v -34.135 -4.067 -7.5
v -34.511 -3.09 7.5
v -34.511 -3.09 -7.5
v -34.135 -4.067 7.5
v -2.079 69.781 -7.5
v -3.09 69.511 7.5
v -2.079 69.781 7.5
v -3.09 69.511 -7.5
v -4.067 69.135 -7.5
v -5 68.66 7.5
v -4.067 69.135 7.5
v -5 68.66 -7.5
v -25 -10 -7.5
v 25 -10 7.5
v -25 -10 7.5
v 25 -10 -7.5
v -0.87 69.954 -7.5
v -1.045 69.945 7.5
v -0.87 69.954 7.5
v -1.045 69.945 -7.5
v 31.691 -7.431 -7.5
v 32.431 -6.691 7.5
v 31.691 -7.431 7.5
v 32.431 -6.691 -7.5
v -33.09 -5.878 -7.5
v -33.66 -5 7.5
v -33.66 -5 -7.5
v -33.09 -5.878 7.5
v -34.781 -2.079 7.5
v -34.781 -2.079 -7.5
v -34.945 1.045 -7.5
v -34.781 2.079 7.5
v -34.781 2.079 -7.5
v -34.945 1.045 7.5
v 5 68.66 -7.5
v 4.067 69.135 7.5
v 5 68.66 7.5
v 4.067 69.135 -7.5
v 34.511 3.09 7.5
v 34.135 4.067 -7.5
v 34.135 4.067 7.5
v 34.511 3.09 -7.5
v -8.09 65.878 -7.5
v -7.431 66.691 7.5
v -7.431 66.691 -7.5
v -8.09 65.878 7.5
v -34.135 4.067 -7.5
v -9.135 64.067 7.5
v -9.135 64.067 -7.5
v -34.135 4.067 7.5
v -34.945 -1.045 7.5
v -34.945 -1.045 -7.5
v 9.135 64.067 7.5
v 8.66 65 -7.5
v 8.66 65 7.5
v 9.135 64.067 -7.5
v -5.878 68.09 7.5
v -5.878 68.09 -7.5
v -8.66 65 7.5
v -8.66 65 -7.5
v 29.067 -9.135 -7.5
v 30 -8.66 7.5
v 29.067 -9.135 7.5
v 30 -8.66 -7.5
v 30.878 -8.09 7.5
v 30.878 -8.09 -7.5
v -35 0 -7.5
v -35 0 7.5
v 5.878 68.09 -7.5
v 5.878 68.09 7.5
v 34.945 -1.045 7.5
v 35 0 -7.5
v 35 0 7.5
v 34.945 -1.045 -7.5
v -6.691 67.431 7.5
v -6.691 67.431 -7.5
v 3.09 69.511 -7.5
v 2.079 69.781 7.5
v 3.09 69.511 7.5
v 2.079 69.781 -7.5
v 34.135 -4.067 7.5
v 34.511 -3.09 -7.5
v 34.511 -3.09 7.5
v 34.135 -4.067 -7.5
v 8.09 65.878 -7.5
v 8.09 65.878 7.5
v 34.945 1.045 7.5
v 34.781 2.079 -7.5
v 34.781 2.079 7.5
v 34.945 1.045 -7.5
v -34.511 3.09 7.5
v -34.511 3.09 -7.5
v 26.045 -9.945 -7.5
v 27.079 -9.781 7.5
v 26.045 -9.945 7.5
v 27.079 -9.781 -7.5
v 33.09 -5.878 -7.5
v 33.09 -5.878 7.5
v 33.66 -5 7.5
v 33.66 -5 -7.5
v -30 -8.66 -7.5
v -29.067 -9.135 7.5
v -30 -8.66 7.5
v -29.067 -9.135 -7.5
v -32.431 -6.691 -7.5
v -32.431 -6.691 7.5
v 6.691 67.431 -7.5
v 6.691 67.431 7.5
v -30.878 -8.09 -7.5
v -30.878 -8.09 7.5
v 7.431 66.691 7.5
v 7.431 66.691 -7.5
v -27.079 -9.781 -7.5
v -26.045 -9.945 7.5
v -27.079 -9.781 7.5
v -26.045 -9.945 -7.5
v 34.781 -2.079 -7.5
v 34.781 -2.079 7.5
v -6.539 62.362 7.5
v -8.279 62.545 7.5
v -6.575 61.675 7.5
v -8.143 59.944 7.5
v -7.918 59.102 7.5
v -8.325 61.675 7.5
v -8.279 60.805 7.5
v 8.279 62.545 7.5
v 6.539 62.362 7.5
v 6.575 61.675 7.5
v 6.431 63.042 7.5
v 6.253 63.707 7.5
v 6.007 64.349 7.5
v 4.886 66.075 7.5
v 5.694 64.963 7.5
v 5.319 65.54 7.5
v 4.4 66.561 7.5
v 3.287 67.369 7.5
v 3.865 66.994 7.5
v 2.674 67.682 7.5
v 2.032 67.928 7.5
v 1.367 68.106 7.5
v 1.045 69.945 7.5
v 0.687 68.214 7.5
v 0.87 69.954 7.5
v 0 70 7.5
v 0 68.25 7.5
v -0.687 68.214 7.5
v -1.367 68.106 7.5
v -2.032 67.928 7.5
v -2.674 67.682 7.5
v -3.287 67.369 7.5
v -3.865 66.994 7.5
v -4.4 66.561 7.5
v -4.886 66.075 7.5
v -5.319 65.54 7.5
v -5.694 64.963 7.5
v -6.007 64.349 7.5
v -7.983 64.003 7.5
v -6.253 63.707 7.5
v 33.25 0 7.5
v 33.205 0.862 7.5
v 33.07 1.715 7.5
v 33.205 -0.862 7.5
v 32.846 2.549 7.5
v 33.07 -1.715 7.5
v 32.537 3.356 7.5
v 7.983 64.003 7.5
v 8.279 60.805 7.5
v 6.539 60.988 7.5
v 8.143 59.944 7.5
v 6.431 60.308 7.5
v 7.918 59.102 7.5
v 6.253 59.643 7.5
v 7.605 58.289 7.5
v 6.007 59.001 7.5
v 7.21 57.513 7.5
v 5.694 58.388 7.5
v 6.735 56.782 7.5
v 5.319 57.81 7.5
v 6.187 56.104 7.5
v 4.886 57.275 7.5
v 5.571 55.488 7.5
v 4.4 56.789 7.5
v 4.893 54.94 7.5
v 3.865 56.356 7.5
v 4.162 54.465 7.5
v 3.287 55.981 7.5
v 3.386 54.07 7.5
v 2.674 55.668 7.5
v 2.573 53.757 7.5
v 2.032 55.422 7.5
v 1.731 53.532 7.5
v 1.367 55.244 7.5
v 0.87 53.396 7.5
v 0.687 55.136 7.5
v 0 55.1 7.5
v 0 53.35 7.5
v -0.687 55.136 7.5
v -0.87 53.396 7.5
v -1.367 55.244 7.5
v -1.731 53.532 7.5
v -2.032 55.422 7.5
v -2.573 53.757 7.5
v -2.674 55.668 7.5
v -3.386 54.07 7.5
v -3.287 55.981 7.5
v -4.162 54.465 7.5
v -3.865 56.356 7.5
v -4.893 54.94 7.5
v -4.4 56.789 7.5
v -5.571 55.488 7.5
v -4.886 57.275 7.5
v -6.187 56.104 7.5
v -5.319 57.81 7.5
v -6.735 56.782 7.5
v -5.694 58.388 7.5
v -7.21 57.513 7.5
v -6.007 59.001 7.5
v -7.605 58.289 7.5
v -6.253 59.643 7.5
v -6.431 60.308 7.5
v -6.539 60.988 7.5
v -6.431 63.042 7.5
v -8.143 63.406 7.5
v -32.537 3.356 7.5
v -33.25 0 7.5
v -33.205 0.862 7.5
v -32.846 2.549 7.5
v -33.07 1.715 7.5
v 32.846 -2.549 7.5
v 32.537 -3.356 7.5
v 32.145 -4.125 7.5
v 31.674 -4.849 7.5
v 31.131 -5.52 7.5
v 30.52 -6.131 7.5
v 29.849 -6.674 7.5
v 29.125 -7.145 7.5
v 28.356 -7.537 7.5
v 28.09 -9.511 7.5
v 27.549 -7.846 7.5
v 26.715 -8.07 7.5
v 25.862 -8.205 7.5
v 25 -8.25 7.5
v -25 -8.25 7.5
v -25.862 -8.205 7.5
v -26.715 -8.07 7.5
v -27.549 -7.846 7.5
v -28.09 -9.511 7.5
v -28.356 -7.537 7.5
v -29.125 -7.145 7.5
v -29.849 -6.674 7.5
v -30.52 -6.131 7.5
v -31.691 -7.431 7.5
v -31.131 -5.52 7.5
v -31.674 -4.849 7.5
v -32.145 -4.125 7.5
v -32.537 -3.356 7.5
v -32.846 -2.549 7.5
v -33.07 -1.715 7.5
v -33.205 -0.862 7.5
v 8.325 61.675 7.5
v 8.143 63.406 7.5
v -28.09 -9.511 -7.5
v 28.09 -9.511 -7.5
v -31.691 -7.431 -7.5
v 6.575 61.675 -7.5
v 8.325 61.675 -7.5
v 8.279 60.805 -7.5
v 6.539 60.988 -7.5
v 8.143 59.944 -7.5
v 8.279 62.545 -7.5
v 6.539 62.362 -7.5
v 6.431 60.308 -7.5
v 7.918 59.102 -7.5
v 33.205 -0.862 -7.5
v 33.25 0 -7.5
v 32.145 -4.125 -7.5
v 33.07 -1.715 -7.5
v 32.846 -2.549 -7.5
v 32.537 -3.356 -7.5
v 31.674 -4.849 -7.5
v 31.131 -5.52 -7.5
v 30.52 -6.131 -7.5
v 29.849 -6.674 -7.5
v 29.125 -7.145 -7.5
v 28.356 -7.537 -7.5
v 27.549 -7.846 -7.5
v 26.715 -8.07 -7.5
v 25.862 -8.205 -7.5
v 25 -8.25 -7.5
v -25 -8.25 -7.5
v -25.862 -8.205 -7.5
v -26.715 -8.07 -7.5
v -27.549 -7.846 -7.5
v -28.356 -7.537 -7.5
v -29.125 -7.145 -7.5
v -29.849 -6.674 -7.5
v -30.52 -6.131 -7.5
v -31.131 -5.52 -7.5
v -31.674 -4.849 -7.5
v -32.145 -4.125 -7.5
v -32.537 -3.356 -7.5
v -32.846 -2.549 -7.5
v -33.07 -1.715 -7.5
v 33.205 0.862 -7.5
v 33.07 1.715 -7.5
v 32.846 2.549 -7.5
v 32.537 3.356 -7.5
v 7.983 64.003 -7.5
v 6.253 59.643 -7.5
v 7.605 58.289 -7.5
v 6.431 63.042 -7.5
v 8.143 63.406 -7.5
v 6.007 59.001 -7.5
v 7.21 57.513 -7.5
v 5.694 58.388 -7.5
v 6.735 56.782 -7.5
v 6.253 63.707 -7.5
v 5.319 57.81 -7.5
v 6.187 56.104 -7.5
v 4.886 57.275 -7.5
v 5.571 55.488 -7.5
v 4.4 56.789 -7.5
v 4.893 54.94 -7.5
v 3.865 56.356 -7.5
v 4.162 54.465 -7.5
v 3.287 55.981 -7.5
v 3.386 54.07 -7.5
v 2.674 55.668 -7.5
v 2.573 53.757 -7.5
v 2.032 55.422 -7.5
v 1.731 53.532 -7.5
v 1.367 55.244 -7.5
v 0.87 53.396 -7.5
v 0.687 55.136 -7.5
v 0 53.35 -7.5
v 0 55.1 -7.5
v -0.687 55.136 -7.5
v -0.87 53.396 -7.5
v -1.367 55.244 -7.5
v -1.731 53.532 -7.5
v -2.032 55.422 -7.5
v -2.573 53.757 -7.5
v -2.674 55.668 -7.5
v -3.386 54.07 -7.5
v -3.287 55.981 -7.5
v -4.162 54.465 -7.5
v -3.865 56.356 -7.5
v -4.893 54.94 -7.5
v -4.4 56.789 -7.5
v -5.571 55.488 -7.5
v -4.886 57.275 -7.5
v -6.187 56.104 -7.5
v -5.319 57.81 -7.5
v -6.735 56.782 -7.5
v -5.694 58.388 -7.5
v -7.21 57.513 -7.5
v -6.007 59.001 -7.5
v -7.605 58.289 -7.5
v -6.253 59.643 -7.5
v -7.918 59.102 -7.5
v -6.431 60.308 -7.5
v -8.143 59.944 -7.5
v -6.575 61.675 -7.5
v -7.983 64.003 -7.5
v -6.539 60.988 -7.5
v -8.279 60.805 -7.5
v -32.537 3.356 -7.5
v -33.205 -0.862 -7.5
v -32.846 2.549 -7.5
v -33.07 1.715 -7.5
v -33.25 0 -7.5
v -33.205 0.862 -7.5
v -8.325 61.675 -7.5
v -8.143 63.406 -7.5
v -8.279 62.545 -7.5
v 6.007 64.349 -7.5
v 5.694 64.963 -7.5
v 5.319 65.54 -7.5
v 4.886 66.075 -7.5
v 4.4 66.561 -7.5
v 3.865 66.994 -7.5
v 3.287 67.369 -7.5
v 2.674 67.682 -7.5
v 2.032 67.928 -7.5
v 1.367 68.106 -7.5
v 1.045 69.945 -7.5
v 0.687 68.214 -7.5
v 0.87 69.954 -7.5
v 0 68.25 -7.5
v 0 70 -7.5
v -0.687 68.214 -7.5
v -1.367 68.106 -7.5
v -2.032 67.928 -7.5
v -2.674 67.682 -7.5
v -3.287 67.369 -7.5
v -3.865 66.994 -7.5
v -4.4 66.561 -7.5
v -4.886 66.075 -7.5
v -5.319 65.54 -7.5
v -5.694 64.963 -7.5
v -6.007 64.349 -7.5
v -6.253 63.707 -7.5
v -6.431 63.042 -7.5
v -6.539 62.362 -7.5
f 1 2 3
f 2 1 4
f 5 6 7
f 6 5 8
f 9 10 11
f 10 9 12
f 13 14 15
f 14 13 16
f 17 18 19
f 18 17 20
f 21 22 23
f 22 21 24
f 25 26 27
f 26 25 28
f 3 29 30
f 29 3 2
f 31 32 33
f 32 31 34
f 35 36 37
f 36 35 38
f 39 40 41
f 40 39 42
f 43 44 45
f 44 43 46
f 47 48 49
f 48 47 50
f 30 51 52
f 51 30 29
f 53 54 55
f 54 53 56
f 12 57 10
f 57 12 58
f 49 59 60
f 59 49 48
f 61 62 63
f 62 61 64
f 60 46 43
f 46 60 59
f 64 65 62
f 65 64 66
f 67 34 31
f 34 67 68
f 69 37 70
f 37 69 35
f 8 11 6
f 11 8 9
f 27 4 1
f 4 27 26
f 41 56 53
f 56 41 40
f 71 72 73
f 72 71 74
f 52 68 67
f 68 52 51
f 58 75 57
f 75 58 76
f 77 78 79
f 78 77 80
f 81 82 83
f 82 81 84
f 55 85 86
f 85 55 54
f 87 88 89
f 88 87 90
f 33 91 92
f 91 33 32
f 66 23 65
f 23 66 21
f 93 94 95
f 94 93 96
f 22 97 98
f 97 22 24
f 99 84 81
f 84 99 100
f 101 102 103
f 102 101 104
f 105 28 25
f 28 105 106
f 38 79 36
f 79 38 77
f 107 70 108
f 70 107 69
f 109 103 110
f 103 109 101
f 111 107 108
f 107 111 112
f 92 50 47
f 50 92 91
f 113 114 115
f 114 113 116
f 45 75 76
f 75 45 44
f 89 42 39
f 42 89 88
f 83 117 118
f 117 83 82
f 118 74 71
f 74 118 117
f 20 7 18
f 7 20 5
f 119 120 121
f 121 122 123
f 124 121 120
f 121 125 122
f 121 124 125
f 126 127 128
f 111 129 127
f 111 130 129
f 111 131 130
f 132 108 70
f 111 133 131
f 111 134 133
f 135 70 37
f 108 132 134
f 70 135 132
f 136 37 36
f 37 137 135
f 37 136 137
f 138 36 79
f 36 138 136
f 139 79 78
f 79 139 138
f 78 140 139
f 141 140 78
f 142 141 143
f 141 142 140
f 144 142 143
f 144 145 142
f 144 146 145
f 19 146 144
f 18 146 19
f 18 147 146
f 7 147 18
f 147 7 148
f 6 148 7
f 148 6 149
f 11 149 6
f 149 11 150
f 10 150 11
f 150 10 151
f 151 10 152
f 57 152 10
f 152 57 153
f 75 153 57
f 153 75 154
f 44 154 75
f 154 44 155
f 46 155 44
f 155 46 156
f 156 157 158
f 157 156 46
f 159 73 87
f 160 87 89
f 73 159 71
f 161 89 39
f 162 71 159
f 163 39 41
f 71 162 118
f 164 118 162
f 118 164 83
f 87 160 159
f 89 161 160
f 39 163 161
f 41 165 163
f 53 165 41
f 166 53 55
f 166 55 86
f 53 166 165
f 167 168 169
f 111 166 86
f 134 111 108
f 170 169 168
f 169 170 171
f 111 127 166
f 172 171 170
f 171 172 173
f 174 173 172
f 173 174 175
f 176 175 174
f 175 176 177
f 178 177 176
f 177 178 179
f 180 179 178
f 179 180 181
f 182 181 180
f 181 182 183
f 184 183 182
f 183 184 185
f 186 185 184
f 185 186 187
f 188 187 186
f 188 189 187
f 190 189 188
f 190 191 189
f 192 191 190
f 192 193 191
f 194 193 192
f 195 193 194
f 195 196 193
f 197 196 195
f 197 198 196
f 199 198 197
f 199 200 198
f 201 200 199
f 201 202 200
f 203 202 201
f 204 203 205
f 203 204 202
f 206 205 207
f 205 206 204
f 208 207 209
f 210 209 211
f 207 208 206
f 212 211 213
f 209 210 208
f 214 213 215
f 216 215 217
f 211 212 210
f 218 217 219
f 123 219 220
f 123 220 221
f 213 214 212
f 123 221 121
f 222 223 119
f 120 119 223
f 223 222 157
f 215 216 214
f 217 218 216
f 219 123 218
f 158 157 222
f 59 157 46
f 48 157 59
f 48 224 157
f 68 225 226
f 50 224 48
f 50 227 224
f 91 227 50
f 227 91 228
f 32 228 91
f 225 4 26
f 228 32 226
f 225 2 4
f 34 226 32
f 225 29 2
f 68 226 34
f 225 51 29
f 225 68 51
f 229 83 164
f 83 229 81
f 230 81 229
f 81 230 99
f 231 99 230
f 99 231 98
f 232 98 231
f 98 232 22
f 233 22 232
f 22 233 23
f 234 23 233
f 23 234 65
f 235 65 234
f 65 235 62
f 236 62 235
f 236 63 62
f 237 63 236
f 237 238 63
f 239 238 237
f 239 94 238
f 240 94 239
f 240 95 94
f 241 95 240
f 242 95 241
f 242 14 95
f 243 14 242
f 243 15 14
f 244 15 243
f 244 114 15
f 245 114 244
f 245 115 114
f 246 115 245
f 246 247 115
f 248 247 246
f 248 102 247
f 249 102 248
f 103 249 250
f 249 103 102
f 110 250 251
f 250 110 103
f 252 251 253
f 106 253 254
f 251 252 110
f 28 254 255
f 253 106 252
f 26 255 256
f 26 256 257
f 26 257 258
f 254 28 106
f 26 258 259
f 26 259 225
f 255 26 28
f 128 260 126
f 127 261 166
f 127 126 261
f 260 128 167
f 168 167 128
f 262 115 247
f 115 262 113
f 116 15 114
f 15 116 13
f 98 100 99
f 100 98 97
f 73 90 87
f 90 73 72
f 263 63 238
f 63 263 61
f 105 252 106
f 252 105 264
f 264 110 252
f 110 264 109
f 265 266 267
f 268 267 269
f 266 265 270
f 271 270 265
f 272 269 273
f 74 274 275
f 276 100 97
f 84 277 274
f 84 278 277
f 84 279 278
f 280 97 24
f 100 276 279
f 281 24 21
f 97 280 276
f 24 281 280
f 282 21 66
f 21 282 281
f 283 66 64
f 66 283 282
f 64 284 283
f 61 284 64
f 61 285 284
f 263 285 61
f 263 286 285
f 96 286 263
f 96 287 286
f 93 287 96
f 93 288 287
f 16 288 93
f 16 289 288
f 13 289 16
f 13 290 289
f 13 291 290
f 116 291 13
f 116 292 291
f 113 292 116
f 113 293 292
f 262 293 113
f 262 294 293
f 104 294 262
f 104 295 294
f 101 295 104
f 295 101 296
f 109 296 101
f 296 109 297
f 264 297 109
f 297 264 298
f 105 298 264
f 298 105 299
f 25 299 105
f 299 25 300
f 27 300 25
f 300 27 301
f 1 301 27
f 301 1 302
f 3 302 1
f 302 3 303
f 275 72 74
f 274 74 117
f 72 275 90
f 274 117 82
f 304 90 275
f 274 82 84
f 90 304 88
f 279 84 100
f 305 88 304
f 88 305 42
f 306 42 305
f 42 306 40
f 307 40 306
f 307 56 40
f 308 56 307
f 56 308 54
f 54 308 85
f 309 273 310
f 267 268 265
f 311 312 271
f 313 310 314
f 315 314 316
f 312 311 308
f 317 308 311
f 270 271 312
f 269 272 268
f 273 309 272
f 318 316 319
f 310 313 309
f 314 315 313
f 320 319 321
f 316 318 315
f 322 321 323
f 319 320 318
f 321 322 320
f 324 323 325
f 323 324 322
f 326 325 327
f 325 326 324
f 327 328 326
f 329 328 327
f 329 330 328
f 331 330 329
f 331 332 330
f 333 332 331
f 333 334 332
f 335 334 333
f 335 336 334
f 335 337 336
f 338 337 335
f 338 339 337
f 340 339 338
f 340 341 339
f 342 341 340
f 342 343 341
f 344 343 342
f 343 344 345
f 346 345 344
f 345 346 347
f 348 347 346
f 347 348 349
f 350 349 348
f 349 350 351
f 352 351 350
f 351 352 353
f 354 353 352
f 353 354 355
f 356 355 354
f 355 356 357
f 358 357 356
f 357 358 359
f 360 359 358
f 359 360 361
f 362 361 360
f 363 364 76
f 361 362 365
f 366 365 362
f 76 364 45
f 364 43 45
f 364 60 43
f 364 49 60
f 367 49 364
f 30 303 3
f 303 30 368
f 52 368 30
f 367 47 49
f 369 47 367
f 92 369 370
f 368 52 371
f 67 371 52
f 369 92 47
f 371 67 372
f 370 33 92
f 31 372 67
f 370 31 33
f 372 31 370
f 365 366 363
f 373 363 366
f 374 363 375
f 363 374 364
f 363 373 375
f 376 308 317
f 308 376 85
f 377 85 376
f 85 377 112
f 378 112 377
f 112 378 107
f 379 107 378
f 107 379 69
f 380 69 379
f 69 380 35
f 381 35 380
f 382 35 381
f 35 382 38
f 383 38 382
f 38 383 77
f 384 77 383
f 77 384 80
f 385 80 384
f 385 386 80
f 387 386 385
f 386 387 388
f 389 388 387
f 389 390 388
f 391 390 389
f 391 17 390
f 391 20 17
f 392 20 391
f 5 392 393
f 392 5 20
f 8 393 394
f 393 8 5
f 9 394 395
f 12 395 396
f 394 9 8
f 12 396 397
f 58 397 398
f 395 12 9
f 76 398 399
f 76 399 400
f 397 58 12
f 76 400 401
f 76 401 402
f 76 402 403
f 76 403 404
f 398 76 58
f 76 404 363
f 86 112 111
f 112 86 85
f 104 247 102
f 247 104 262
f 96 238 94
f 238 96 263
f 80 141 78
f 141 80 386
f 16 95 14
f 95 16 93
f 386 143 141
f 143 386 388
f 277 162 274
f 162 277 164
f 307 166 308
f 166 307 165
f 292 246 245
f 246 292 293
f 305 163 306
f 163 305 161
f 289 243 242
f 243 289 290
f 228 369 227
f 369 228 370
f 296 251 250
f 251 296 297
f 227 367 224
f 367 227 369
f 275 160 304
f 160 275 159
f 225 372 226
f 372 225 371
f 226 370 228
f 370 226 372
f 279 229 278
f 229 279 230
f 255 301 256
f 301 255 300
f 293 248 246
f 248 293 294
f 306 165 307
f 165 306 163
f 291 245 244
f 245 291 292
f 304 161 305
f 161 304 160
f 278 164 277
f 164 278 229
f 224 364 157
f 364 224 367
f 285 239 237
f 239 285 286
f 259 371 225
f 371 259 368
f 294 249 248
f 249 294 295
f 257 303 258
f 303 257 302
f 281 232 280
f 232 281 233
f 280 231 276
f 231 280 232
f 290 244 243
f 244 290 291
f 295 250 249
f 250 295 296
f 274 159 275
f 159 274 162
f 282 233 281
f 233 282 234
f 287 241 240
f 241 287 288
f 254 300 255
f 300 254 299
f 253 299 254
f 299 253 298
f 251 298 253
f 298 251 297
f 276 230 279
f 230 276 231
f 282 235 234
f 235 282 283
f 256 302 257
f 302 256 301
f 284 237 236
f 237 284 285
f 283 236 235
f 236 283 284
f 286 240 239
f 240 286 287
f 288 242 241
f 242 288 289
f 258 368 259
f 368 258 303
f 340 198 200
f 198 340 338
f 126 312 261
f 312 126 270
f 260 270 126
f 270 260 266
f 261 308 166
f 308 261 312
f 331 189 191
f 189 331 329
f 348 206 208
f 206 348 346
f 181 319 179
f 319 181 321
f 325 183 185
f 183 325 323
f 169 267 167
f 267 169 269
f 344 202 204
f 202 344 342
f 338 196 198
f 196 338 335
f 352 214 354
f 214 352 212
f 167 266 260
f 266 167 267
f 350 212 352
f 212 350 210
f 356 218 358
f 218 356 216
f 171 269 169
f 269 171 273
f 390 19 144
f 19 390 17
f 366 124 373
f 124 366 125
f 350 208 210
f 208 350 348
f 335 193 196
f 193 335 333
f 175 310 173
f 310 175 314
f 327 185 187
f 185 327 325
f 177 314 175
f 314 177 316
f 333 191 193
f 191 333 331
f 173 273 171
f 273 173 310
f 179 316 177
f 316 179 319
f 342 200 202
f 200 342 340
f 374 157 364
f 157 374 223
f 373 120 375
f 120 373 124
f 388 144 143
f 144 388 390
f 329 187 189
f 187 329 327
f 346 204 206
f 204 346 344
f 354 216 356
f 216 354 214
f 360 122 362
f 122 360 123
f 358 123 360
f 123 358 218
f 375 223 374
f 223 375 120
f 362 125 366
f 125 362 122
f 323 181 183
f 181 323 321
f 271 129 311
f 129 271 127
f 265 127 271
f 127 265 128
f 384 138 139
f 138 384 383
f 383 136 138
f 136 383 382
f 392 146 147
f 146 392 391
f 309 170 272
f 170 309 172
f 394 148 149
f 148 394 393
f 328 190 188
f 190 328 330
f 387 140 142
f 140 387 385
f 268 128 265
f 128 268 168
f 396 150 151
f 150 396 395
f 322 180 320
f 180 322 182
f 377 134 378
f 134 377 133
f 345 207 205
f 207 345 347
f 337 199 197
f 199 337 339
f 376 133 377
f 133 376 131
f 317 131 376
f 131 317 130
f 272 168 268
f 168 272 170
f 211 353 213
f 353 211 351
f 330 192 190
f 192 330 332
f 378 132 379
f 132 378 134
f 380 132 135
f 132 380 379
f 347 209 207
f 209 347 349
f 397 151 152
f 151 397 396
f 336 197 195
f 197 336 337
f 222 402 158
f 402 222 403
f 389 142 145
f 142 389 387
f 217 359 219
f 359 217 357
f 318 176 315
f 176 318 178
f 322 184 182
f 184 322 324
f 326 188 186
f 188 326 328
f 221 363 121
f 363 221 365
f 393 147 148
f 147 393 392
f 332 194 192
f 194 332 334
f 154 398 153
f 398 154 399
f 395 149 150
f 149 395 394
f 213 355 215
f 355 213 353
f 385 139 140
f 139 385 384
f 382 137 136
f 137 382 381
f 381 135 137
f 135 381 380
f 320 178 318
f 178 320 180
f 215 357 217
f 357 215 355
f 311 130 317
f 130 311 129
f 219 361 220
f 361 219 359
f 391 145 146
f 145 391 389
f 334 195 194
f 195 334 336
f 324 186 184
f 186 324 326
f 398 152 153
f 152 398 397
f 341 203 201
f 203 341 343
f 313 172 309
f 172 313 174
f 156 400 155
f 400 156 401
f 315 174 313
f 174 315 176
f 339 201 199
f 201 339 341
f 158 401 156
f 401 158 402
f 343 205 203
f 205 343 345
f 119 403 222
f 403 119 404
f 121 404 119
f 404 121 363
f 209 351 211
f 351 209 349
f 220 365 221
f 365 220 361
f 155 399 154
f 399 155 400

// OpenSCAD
// Parametric Spool Holder v2
// triangular end pieces that support a dowel
// that holds spools of wire, solder...
// Not really meant for big spools of filament

// preview[view:south, tilt:top]

// the width of the support
width = 70;             //[40:300]

// the height of the support
height = 80;            //[40:300]

//  depth of the support
depth = 15;             //[10:5:50]

// wall thickness of the support
wall = 1.75;            //[.5:.25:3.0]

// radius for rounded corners
cornerRadius = 10;      //[2:1:20]

// radius of dowel
dowelRadius = 6.35;

// extra allowance for dowel
slop = .45;             //[.2:.1:1.5]

/* [Hidden] */
$fn = 60;

insideCornerRadius = cornerRadius-wall;

difference() {
   union() {
      difference() {
         hull() {
            translate([-width/2+cornerRadius, 0, 0])
               cylinder(depth, r=cornerRadius, center=true);
            translate([width/2-cornerRadius, 0, 0])
               cylinder(depth, r=cornerRadius, center=true);
            translate([0, height-2*cornerRadius, 0])
               cylinder(depth, r=cornerRadius, center=true);
         }
         hull() {
            translate([-width/2+insideCornerRadius+wall, 0, 0])
               cylinder(depth, r=insideCornerRadius, center=true);
            translate([width/2-insideCornerRadius-wall, 0, 0])
               cylinder(depth, r=insideCornerRadius, center=true);
            translate([0, height-2*insideCornerRadius-wall, 0])
               cylinder(depth+10, r=insideCornerRadius, center=true);
         }
      }
      translate([0, height-dowelRadius-cornerRadius-wall-slop/2, 0])
         cylinder(depth, r=dowelRadius + slop/2 + wall, center=true);
   }
   translate([0, height-dowelRadius-cornerRadius-wall-slop/2, 0])
      cylinder(depth+10, r=dowelRadius + slop/2, center=true);
}
